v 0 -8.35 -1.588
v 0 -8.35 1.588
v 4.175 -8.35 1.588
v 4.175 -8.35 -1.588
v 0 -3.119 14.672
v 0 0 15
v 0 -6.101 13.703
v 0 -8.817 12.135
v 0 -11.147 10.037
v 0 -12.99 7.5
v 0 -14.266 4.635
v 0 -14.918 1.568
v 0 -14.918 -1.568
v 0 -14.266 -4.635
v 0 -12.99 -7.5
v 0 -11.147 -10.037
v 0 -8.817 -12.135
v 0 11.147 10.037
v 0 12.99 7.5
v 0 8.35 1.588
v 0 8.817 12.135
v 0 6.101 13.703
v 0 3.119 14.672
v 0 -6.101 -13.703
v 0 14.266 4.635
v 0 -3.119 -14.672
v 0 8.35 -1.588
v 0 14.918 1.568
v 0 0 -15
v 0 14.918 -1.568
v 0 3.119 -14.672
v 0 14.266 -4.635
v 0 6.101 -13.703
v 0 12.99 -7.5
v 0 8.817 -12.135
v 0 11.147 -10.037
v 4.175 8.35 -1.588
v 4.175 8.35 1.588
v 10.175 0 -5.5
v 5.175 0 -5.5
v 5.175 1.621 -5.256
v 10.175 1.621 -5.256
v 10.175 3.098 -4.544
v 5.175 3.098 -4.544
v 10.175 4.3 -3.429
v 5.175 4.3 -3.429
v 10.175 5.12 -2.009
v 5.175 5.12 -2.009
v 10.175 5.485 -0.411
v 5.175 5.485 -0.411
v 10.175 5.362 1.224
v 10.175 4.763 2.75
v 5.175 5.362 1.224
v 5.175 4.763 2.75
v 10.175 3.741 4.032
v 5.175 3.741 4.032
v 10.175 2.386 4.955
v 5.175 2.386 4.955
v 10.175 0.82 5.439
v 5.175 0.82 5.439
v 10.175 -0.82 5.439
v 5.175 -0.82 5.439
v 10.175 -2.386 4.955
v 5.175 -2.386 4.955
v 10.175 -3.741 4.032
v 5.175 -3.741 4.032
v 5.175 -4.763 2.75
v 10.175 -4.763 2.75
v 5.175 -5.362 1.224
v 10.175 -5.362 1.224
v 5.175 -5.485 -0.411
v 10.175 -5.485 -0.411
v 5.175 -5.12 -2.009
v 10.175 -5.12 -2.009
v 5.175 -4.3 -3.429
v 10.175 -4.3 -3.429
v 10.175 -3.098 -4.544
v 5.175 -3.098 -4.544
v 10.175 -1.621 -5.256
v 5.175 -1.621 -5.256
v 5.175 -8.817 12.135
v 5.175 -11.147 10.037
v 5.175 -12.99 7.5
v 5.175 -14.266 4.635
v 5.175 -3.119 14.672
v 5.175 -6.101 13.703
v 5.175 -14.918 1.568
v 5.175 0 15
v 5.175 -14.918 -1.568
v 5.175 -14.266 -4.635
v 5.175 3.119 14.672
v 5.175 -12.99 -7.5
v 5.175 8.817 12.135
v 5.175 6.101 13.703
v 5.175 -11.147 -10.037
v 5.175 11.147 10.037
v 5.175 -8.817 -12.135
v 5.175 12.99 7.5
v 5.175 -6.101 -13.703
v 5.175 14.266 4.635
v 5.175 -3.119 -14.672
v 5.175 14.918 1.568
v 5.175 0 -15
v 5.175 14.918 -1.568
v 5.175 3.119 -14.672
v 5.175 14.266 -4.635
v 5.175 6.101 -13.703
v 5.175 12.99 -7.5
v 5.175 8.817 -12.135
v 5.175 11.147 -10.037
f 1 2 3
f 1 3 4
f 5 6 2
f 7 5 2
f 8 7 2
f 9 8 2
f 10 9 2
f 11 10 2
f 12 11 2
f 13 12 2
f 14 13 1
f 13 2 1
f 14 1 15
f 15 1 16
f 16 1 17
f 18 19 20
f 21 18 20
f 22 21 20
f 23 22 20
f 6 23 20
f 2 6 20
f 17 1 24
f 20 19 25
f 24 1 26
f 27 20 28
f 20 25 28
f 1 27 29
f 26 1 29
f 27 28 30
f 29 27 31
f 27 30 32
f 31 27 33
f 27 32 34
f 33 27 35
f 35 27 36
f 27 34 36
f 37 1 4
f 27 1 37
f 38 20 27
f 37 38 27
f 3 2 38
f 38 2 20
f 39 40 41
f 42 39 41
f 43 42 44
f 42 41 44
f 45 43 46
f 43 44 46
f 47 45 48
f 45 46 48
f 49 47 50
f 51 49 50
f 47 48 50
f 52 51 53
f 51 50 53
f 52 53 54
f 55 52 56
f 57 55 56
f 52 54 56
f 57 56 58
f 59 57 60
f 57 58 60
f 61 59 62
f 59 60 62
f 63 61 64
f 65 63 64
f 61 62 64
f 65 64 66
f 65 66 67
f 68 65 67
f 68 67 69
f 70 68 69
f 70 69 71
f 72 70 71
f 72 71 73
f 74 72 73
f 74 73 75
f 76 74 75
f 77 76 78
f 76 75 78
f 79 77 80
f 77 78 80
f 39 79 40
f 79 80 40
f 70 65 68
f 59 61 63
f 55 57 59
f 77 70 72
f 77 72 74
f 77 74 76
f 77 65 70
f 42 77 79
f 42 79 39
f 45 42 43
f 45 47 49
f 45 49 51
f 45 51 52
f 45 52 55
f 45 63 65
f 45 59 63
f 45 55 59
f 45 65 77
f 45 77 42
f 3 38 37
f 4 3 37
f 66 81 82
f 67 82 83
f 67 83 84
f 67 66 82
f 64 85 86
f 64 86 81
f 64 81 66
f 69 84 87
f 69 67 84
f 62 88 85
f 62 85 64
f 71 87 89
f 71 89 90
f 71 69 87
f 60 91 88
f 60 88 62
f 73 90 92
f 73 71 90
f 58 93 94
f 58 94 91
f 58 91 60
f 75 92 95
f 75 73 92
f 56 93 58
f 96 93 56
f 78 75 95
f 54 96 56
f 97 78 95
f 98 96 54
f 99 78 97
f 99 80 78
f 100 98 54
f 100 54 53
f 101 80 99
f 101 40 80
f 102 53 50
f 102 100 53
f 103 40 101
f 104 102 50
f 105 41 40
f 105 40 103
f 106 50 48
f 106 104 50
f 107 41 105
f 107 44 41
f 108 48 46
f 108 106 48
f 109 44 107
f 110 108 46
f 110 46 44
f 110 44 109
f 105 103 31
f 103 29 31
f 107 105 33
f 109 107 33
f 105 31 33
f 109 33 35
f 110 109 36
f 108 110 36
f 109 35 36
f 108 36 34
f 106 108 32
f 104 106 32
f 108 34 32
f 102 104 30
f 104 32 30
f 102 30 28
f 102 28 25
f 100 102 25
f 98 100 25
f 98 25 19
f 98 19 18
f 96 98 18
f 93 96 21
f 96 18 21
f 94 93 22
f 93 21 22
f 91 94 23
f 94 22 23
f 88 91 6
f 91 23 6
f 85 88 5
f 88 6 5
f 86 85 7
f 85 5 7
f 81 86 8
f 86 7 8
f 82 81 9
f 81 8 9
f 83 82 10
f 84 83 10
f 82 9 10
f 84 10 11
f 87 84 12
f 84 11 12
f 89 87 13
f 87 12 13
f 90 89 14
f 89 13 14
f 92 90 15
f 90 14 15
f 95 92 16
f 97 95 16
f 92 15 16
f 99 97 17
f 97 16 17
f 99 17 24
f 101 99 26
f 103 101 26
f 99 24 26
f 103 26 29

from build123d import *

# Parameters (mm, degrees)
SKETCH1_R           = 15
SKETCH1_W           = 3.175
SKETCH1_H           = 16.7
BOSS_EXTRUDE1_DEPTH = 4.175
SKETCH2_R           = 15
BOSS_EXTRUDE2_DEPTH = 1
SKETCH3_R           = 5.5
BOSS_EXTRUDE3_DEPTH = 5


with BuildPart() as part:
    # Sketch1 → Boss-Extrude1 (new body)
    with BuildSketch(Plane(origin=(0, 0, 0), x_dir=(0, 0, -1), z_dir=(1, 0, 0))):
        Circle(SKETCH1_R)
        Rectangle(SKETCH1_W, SKETCH1_H, mode=Mode.SUBTRACT)
    extrude(amount=BOSS_EXTRUDE1_DEPTH)

    # Sketch2 → Boss-Extrude2 (add)
    with BuildSketch(Plane(origin=(4.175, 0, 0), x_dir=(0, 0, -1), z_dir=(1, 0, 0))):
        Circle(SKETCH2_R)
    extrude(amount=BOSS_EXTRUDE2_DEPTH)

    # Sketch3 → Boss-Extrude3 (add)
    with BuildSketch(Plane(origin=(5.175, 0, 0), x_dir=(0, 0, -1), z_dir=(1, 0, 0))):
        Circle(SKETCH3_R)
    extrude(amount=BOSS_EXTRUDE3_DEPTH)


solid = part.part
